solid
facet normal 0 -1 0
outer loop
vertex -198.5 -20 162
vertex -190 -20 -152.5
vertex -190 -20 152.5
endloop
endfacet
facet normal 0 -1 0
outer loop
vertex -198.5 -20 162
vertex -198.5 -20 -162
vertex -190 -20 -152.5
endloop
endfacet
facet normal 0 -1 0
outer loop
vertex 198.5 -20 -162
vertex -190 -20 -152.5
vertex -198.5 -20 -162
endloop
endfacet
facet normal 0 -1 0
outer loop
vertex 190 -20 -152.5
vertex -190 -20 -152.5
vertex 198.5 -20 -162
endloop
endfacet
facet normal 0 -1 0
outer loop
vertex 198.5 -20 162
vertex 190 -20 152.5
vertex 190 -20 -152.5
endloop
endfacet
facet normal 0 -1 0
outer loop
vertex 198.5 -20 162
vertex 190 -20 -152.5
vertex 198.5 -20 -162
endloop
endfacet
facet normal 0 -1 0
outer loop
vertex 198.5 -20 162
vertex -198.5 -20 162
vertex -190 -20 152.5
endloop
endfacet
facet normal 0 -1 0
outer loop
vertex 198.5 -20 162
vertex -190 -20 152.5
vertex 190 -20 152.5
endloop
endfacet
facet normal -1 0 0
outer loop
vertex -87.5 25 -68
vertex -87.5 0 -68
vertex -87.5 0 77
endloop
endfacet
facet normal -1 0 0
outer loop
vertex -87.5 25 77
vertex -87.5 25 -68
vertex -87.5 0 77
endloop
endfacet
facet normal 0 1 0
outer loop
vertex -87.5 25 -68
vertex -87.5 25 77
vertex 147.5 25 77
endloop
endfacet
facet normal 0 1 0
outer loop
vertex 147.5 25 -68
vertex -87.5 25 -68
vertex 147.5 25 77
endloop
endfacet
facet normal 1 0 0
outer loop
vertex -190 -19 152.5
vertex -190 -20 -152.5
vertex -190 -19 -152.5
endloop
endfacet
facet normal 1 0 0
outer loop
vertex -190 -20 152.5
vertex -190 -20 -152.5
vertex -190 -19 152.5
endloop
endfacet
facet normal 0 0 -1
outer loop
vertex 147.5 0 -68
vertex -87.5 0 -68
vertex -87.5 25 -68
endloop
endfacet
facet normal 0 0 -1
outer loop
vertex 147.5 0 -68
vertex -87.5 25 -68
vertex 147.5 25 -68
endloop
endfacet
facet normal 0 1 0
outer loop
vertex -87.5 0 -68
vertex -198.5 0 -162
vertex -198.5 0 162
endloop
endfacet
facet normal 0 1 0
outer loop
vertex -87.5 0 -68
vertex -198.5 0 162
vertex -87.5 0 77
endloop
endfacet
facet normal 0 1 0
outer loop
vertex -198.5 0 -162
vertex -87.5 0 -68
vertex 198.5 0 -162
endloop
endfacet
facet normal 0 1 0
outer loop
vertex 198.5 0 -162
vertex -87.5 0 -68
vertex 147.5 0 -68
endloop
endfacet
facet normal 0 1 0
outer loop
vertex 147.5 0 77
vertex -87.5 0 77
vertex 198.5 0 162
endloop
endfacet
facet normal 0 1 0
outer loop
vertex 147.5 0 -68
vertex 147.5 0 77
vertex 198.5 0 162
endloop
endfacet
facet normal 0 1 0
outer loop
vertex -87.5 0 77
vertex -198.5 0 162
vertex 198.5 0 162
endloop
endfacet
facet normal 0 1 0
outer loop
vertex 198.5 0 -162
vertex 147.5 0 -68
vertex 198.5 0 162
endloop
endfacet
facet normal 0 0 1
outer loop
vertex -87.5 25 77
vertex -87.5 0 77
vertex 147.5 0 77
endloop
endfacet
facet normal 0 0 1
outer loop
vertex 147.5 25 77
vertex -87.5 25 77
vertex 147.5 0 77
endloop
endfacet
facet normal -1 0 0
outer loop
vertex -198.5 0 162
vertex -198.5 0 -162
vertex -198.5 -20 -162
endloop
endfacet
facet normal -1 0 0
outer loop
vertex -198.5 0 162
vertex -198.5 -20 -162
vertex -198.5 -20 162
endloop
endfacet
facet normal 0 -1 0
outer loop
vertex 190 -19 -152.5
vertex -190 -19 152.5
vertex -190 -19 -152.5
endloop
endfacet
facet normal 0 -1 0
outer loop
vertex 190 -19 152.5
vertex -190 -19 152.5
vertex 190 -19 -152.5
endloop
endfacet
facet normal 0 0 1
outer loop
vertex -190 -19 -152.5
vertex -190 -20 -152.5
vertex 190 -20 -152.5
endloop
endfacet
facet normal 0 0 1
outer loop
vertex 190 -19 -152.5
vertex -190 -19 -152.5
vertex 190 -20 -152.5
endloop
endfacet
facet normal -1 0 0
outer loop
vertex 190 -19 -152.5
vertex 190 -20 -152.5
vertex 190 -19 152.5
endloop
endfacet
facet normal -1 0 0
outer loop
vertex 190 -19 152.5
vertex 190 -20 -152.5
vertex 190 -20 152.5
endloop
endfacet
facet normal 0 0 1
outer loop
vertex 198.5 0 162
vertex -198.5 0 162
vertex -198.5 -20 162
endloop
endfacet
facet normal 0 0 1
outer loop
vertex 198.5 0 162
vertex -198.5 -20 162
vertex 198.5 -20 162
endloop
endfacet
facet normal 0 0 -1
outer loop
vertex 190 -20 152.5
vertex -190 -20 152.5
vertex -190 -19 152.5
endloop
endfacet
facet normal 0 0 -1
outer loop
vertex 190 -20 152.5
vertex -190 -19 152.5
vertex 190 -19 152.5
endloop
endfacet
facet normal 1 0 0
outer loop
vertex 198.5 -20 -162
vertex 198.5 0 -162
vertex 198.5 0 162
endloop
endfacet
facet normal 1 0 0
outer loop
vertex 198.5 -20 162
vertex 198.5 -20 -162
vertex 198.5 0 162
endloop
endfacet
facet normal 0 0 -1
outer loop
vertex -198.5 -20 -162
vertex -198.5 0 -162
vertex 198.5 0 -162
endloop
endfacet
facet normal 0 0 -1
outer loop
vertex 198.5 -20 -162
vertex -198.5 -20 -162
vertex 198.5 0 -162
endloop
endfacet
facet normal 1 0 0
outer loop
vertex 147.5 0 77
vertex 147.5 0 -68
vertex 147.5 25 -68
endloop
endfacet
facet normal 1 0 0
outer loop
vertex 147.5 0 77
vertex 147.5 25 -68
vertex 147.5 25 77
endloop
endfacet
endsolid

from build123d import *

# Parameters (mm, degrees)
F0_W     = 397
F0_H     = 324
F1_DEPTH = 20
F2_W     = 380
F2_H     = 305
F3_DEPTH = 1
F4_W     = 235
F4_H     = 145
F5_DEPTH = 25


with BuildPart() as f1:
    # F0 (on Front) → F1 (new body)
    with BuildSketch(Plane.XZ):
        Rectangle(F0_W, F0_H)
    extrude(amount=F1_DEPTH)

    # F2 (on face) → F3 (cut)
    with BuildSketch(Plane.XZ.offset(20)):
        Rectangle(F2_W, F2_H)
    extrude(amount=-F3_DEPTH, mode=Mode.SUBTRACT)

    # F4 (on face) → F5 (join)
    with BuildSketch(Plane.XZ):
        with Locations((30, 4.5)):
            Rectangle(F4_W, F4_H)
    extrude(amount=-F5_DEPTH)


solid = f1.part
